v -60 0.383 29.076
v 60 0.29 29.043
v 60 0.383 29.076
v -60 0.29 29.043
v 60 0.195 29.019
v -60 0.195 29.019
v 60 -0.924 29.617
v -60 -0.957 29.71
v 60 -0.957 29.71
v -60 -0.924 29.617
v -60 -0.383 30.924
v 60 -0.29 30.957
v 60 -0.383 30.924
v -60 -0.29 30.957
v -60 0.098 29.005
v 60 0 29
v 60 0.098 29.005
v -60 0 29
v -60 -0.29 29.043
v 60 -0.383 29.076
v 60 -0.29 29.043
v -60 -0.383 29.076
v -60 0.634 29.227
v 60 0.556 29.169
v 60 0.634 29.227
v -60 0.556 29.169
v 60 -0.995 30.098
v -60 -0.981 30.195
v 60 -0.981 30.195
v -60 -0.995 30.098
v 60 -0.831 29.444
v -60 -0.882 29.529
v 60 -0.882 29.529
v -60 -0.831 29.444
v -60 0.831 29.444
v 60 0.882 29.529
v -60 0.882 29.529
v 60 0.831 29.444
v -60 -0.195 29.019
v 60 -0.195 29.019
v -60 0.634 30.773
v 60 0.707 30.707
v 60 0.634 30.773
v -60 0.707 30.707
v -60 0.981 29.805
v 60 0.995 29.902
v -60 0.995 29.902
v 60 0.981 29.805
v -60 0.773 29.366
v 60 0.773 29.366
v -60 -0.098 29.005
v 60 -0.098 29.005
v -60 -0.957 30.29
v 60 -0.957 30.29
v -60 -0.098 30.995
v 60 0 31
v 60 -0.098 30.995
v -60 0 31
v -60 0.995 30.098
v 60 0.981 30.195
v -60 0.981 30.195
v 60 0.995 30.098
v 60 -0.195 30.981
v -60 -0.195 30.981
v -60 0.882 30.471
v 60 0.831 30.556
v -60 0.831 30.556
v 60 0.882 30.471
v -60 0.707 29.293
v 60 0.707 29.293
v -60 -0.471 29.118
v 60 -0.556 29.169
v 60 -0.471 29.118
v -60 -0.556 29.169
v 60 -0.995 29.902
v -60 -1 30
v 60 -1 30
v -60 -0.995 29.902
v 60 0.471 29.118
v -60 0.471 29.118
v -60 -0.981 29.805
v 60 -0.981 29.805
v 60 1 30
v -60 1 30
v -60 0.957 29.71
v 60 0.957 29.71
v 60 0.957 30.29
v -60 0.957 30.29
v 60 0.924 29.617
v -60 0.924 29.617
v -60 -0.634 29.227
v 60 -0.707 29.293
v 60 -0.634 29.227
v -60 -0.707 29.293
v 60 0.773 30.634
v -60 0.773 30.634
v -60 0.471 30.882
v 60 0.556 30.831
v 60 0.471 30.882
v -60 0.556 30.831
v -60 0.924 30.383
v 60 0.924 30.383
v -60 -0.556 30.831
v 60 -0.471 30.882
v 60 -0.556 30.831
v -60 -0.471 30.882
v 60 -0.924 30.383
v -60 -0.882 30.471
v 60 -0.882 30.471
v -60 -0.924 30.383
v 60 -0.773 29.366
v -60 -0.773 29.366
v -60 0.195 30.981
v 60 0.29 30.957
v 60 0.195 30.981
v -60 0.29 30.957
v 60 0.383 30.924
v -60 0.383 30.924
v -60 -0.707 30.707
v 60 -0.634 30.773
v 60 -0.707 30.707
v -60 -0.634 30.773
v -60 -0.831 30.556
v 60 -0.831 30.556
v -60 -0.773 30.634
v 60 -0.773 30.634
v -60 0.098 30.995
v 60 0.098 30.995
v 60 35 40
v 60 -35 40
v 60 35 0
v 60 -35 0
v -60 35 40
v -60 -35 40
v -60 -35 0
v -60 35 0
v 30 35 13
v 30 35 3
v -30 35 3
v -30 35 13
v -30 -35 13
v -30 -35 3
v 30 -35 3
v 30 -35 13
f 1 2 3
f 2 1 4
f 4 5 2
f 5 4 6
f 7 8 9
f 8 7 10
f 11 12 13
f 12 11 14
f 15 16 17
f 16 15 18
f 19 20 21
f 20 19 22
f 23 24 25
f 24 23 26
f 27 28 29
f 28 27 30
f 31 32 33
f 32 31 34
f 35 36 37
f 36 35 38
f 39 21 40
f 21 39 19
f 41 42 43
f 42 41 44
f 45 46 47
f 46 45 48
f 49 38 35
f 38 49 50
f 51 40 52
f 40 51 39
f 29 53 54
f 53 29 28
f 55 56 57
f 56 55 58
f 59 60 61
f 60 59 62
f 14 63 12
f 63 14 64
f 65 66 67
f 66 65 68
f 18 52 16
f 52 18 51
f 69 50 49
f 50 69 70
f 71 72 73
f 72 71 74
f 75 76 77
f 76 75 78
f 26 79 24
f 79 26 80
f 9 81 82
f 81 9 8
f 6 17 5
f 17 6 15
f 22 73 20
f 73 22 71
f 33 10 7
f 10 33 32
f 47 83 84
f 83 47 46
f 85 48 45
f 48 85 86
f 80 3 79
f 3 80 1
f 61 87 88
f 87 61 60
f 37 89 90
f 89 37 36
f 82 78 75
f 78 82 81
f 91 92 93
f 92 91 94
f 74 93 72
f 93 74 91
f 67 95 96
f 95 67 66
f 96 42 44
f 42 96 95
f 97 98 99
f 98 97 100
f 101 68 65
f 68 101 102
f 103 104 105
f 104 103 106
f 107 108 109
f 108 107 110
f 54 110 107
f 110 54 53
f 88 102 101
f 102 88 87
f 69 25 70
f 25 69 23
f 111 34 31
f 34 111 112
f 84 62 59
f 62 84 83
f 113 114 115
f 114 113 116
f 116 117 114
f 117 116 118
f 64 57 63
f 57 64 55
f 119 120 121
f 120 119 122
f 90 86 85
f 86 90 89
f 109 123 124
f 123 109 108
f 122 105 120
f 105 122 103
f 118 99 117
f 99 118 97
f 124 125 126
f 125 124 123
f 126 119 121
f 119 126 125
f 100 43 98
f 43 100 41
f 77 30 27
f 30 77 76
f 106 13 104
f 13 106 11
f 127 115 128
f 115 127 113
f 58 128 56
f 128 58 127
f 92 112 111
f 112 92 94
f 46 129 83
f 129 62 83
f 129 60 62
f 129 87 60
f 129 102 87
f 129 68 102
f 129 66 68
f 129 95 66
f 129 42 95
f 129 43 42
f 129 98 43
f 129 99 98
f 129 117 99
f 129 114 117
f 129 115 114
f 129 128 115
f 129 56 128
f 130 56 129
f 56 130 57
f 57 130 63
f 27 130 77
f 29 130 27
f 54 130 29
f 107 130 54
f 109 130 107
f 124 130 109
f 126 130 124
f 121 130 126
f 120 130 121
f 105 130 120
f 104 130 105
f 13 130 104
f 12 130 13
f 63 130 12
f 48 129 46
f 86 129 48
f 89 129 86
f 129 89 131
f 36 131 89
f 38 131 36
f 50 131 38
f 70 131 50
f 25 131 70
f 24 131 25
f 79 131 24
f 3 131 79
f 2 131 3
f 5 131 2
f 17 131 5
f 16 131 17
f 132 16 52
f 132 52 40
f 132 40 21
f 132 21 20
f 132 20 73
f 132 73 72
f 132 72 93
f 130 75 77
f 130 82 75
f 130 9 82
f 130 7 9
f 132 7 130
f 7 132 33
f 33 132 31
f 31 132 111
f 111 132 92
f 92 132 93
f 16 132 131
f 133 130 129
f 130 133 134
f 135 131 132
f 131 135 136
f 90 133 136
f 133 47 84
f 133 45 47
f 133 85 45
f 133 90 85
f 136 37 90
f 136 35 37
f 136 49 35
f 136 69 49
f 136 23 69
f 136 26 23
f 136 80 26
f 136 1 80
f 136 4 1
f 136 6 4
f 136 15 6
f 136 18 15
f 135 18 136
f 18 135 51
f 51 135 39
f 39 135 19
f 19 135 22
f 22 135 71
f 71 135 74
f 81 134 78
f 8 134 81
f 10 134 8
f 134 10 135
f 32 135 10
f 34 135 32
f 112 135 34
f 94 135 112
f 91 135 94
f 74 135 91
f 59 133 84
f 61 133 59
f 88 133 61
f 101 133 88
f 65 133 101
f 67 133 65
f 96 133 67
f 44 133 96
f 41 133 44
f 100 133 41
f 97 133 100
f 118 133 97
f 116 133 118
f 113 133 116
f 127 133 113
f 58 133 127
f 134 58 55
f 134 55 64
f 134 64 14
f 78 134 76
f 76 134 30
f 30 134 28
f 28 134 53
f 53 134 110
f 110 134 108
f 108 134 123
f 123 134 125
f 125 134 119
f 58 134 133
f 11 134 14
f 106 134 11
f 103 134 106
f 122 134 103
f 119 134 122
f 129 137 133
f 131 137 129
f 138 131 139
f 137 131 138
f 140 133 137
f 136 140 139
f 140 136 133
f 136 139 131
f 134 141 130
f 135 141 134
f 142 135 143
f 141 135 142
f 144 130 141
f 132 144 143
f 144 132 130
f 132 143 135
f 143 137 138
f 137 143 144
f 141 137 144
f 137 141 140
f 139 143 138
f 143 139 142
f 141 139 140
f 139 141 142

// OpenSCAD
// Mini horizontal gel-electrophoresis box - buffer tank
// Print orientation: tank resting on XY plane, open top facing +Z

// ---------- Parameters ----------
outer_x      = 120;   // outer length in X (mm)
outer_y      = 70;    // outer width in Y (mm)
outer_z      = 40;    // outer height in Z (mm)
wall         = 3;     // wall thickness (mm)
floor        = 3;     // floor thickness (mm)
platform_x   = 60;    // platform length in X (mm)
platform_y   = outer_y; // platform spans full inner width (mm)
platform_top = 13;    // platform top height above outer bottom (mm)
hole_d       = 2;     // electrode hole diameter (mm)
hole_y       = 0;     // electrode hole Y position (mm)
hole_z       = 30;    // electrode hole Z position (mm)
eps          = 0.5;   // cutter overshoot past faces (mm)

$fn = 64;

// ---------- Derived ----------
inner_x = outer_x - 2 * wall;   // 114 mm
inner_z = outer_z - floor;      // 37 mm (floor at z = 0..3)

// ---------- Model ----------
difference() {
    // Tank body (solid floor, open top)
    translate([-outer_x / 2, -outer_y / 2, 0])
        cube([outer_x, outer_y, outer_z]);

    // Raised platform for gel tray, centred in X
    translate([-platform_x / 2, -platform_y / 2, floor])
        cube([platform_x, platform_y, platform_top - floor]);

    // Horizontal electrode holes through each end wall along X
    for (sx = [-1, 1])
        translate([sx > 0 ? outer_x / 2 - eps : -outer_x / 2 - eps,
                   hole_y, hole_z])
            rotate([0, 90, 0])
                cylinder(d = hole_d, h = outer_x + 2 * eps);
}
